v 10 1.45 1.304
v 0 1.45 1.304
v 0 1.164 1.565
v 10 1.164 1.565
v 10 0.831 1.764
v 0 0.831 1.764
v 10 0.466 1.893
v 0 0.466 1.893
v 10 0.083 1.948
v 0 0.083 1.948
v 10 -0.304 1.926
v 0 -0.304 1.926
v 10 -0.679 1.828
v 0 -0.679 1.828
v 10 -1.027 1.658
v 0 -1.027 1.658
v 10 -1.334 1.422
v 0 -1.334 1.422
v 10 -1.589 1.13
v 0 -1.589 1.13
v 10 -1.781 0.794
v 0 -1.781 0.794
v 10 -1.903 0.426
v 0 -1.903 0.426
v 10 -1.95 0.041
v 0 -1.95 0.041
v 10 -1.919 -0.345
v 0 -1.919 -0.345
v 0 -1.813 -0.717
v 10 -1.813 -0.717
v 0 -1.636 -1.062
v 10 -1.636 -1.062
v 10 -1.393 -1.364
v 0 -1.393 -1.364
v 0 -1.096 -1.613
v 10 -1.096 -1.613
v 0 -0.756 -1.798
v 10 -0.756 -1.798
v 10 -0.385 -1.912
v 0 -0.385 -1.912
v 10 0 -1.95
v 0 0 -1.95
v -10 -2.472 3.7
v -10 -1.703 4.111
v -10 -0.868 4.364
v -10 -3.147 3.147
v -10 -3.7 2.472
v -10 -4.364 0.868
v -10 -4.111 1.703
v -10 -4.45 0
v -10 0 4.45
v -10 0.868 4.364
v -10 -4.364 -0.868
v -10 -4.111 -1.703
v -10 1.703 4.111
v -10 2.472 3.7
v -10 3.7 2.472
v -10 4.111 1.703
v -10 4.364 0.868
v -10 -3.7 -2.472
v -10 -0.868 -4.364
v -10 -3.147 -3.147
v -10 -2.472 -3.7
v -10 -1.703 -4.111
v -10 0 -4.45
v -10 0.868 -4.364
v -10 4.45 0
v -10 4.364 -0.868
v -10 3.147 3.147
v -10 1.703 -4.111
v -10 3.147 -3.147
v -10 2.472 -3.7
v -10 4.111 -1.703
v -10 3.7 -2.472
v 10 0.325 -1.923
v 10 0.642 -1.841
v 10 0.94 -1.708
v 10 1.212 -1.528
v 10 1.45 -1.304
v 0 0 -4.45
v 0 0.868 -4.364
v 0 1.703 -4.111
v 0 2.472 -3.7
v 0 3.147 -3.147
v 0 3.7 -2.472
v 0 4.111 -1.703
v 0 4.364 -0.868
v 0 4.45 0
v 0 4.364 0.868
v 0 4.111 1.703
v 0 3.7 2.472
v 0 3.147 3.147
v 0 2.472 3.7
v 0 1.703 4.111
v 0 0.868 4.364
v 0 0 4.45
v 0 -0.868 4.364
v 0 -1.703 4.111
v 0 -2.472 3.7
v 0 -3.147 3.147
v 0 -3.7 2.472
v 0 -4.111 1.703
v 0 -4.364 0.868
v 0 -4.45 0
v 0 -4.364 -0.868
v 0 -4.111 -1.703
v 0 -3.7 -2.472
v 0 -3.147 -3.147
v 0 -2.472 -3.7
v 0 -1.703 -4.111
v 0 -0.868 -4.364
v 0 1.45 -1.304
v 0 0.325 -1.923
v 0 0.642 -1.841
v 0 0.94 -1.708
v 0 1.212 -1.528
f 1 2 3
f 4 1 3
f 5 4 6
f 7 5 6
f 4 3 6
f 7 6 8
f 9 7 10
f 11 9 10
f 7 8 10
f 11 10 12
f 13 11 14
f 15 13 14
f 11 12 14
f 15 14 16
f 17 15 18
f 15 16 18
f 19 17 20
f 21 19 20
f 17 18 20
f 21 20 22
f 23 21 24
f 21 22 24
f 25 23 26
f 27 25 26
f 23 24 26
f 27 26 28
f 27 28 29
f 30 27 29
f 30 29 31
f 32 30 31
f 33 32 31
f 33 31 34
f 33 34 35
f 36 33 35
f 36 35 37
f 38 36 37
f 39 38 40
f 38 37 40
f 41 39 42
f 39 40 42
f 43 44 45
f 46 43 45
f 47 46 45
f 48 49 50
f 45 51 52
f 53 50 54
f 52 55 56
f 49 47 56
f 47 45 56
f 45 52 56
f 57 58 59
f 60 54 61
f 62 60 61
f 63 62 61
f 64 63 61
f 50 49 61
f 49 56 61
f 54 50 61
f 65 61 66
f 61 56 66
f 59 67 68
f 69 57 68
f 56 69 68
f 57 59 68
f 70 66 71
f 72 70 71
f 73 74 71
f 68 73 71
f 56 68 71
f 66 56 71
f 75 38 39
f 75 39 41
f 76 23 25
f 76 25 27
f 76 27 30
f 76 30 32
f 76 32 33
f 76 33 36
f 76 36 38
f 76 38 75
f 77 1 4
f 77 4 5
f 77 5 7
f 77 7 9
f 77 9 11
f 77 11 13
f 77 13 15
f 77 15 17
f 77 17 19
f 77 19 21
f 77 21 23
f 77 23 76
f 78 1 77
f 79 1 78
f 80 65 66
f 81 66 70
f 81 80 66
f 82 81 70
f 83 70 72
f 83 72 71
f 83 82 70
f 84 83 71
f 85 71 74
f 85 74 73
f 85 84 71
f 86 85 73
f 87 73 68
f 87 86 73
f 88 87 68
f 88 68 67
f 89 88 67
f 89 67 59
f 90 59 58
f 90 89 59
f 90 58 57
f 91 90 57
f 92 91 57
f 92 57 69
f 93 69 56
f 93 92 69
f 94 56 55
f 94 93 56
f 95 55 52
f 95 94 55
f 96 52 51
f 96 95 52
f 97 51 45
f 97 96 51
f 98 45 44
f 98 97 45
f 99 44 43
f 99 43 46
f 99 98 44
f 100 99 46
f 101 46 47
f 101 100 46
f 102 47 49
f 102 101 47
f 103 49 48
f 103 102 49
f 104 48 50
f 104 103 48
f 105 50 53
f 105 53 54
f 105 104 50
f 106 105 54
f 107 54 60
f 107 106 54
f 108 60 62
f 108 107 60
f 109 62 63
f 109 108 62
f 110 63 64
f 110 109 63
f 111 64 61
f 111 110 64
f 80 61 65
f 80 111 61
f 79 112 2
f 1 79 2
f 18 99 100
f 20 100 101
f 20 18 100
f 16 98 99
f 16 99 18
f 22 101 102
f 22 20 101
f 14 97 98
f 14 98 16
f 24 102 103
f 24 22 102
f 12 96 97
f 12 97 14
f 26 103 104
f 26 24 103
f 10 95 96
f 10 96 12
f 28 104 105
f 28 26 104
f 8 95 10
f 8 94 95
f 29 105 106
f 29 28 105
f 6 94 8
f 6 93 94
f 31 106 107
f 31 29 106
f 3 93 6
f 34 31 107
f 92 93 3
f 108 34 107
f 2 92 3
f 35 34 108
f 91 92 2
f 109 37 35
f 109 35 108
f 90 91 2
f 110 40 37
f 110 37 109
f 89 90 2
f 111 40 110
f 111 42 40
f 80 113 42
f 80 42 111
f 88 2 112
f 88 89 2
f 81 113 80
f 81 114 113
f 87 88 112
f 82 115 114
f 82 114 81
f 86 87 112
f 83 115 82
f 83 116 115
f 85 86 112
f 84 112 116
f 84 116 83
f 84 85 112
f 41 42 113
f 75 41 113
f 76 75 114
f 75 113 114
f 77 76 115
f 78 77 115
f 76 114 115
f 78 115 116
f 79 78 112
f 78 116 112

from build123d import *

# Parameters (mm, degrees)
BOSS_EXTRUDE1_DEPTH = 10
SKETCH1_3_R         = 4.45
BOSS_EXTRUDE2_DEPTH = 10


with BuildPart() as part:
    # Sketch1 → Boss-Extrude1 (new body)
    with BuildSketch(Plane(origin=(0, 0, 0), x_dir=(0, 0, -1), z_dir=(1, 0, 0))):
        with BuildLine():
            Line((1.303840481, 1.45), (-1.303840481, 1.45))
            ThreePointArc((-1.303840481, 1.45), (-0.793728878, -1.78114976), (1.95, 0))
            ThreePointArc((1.95, 0), (1.78114976, 0.793728878), (1.303840481, 1.45))
        make_face()
    extrude(amount=BOSS_EXTRUDE1_DEPTH)

    # Sketch1<3> → Boss-Extrude2 (add)
    with BuildSketch(Plane(origin=(0, 0, 0), x_dir=(0, 0, -1), z_dir=(1, 0, 0))):
        Circle(SKETCH1_3_R)
    extrude(amount=-BOSS_EXTRUDE2_DEPTH)


solid = part.part
